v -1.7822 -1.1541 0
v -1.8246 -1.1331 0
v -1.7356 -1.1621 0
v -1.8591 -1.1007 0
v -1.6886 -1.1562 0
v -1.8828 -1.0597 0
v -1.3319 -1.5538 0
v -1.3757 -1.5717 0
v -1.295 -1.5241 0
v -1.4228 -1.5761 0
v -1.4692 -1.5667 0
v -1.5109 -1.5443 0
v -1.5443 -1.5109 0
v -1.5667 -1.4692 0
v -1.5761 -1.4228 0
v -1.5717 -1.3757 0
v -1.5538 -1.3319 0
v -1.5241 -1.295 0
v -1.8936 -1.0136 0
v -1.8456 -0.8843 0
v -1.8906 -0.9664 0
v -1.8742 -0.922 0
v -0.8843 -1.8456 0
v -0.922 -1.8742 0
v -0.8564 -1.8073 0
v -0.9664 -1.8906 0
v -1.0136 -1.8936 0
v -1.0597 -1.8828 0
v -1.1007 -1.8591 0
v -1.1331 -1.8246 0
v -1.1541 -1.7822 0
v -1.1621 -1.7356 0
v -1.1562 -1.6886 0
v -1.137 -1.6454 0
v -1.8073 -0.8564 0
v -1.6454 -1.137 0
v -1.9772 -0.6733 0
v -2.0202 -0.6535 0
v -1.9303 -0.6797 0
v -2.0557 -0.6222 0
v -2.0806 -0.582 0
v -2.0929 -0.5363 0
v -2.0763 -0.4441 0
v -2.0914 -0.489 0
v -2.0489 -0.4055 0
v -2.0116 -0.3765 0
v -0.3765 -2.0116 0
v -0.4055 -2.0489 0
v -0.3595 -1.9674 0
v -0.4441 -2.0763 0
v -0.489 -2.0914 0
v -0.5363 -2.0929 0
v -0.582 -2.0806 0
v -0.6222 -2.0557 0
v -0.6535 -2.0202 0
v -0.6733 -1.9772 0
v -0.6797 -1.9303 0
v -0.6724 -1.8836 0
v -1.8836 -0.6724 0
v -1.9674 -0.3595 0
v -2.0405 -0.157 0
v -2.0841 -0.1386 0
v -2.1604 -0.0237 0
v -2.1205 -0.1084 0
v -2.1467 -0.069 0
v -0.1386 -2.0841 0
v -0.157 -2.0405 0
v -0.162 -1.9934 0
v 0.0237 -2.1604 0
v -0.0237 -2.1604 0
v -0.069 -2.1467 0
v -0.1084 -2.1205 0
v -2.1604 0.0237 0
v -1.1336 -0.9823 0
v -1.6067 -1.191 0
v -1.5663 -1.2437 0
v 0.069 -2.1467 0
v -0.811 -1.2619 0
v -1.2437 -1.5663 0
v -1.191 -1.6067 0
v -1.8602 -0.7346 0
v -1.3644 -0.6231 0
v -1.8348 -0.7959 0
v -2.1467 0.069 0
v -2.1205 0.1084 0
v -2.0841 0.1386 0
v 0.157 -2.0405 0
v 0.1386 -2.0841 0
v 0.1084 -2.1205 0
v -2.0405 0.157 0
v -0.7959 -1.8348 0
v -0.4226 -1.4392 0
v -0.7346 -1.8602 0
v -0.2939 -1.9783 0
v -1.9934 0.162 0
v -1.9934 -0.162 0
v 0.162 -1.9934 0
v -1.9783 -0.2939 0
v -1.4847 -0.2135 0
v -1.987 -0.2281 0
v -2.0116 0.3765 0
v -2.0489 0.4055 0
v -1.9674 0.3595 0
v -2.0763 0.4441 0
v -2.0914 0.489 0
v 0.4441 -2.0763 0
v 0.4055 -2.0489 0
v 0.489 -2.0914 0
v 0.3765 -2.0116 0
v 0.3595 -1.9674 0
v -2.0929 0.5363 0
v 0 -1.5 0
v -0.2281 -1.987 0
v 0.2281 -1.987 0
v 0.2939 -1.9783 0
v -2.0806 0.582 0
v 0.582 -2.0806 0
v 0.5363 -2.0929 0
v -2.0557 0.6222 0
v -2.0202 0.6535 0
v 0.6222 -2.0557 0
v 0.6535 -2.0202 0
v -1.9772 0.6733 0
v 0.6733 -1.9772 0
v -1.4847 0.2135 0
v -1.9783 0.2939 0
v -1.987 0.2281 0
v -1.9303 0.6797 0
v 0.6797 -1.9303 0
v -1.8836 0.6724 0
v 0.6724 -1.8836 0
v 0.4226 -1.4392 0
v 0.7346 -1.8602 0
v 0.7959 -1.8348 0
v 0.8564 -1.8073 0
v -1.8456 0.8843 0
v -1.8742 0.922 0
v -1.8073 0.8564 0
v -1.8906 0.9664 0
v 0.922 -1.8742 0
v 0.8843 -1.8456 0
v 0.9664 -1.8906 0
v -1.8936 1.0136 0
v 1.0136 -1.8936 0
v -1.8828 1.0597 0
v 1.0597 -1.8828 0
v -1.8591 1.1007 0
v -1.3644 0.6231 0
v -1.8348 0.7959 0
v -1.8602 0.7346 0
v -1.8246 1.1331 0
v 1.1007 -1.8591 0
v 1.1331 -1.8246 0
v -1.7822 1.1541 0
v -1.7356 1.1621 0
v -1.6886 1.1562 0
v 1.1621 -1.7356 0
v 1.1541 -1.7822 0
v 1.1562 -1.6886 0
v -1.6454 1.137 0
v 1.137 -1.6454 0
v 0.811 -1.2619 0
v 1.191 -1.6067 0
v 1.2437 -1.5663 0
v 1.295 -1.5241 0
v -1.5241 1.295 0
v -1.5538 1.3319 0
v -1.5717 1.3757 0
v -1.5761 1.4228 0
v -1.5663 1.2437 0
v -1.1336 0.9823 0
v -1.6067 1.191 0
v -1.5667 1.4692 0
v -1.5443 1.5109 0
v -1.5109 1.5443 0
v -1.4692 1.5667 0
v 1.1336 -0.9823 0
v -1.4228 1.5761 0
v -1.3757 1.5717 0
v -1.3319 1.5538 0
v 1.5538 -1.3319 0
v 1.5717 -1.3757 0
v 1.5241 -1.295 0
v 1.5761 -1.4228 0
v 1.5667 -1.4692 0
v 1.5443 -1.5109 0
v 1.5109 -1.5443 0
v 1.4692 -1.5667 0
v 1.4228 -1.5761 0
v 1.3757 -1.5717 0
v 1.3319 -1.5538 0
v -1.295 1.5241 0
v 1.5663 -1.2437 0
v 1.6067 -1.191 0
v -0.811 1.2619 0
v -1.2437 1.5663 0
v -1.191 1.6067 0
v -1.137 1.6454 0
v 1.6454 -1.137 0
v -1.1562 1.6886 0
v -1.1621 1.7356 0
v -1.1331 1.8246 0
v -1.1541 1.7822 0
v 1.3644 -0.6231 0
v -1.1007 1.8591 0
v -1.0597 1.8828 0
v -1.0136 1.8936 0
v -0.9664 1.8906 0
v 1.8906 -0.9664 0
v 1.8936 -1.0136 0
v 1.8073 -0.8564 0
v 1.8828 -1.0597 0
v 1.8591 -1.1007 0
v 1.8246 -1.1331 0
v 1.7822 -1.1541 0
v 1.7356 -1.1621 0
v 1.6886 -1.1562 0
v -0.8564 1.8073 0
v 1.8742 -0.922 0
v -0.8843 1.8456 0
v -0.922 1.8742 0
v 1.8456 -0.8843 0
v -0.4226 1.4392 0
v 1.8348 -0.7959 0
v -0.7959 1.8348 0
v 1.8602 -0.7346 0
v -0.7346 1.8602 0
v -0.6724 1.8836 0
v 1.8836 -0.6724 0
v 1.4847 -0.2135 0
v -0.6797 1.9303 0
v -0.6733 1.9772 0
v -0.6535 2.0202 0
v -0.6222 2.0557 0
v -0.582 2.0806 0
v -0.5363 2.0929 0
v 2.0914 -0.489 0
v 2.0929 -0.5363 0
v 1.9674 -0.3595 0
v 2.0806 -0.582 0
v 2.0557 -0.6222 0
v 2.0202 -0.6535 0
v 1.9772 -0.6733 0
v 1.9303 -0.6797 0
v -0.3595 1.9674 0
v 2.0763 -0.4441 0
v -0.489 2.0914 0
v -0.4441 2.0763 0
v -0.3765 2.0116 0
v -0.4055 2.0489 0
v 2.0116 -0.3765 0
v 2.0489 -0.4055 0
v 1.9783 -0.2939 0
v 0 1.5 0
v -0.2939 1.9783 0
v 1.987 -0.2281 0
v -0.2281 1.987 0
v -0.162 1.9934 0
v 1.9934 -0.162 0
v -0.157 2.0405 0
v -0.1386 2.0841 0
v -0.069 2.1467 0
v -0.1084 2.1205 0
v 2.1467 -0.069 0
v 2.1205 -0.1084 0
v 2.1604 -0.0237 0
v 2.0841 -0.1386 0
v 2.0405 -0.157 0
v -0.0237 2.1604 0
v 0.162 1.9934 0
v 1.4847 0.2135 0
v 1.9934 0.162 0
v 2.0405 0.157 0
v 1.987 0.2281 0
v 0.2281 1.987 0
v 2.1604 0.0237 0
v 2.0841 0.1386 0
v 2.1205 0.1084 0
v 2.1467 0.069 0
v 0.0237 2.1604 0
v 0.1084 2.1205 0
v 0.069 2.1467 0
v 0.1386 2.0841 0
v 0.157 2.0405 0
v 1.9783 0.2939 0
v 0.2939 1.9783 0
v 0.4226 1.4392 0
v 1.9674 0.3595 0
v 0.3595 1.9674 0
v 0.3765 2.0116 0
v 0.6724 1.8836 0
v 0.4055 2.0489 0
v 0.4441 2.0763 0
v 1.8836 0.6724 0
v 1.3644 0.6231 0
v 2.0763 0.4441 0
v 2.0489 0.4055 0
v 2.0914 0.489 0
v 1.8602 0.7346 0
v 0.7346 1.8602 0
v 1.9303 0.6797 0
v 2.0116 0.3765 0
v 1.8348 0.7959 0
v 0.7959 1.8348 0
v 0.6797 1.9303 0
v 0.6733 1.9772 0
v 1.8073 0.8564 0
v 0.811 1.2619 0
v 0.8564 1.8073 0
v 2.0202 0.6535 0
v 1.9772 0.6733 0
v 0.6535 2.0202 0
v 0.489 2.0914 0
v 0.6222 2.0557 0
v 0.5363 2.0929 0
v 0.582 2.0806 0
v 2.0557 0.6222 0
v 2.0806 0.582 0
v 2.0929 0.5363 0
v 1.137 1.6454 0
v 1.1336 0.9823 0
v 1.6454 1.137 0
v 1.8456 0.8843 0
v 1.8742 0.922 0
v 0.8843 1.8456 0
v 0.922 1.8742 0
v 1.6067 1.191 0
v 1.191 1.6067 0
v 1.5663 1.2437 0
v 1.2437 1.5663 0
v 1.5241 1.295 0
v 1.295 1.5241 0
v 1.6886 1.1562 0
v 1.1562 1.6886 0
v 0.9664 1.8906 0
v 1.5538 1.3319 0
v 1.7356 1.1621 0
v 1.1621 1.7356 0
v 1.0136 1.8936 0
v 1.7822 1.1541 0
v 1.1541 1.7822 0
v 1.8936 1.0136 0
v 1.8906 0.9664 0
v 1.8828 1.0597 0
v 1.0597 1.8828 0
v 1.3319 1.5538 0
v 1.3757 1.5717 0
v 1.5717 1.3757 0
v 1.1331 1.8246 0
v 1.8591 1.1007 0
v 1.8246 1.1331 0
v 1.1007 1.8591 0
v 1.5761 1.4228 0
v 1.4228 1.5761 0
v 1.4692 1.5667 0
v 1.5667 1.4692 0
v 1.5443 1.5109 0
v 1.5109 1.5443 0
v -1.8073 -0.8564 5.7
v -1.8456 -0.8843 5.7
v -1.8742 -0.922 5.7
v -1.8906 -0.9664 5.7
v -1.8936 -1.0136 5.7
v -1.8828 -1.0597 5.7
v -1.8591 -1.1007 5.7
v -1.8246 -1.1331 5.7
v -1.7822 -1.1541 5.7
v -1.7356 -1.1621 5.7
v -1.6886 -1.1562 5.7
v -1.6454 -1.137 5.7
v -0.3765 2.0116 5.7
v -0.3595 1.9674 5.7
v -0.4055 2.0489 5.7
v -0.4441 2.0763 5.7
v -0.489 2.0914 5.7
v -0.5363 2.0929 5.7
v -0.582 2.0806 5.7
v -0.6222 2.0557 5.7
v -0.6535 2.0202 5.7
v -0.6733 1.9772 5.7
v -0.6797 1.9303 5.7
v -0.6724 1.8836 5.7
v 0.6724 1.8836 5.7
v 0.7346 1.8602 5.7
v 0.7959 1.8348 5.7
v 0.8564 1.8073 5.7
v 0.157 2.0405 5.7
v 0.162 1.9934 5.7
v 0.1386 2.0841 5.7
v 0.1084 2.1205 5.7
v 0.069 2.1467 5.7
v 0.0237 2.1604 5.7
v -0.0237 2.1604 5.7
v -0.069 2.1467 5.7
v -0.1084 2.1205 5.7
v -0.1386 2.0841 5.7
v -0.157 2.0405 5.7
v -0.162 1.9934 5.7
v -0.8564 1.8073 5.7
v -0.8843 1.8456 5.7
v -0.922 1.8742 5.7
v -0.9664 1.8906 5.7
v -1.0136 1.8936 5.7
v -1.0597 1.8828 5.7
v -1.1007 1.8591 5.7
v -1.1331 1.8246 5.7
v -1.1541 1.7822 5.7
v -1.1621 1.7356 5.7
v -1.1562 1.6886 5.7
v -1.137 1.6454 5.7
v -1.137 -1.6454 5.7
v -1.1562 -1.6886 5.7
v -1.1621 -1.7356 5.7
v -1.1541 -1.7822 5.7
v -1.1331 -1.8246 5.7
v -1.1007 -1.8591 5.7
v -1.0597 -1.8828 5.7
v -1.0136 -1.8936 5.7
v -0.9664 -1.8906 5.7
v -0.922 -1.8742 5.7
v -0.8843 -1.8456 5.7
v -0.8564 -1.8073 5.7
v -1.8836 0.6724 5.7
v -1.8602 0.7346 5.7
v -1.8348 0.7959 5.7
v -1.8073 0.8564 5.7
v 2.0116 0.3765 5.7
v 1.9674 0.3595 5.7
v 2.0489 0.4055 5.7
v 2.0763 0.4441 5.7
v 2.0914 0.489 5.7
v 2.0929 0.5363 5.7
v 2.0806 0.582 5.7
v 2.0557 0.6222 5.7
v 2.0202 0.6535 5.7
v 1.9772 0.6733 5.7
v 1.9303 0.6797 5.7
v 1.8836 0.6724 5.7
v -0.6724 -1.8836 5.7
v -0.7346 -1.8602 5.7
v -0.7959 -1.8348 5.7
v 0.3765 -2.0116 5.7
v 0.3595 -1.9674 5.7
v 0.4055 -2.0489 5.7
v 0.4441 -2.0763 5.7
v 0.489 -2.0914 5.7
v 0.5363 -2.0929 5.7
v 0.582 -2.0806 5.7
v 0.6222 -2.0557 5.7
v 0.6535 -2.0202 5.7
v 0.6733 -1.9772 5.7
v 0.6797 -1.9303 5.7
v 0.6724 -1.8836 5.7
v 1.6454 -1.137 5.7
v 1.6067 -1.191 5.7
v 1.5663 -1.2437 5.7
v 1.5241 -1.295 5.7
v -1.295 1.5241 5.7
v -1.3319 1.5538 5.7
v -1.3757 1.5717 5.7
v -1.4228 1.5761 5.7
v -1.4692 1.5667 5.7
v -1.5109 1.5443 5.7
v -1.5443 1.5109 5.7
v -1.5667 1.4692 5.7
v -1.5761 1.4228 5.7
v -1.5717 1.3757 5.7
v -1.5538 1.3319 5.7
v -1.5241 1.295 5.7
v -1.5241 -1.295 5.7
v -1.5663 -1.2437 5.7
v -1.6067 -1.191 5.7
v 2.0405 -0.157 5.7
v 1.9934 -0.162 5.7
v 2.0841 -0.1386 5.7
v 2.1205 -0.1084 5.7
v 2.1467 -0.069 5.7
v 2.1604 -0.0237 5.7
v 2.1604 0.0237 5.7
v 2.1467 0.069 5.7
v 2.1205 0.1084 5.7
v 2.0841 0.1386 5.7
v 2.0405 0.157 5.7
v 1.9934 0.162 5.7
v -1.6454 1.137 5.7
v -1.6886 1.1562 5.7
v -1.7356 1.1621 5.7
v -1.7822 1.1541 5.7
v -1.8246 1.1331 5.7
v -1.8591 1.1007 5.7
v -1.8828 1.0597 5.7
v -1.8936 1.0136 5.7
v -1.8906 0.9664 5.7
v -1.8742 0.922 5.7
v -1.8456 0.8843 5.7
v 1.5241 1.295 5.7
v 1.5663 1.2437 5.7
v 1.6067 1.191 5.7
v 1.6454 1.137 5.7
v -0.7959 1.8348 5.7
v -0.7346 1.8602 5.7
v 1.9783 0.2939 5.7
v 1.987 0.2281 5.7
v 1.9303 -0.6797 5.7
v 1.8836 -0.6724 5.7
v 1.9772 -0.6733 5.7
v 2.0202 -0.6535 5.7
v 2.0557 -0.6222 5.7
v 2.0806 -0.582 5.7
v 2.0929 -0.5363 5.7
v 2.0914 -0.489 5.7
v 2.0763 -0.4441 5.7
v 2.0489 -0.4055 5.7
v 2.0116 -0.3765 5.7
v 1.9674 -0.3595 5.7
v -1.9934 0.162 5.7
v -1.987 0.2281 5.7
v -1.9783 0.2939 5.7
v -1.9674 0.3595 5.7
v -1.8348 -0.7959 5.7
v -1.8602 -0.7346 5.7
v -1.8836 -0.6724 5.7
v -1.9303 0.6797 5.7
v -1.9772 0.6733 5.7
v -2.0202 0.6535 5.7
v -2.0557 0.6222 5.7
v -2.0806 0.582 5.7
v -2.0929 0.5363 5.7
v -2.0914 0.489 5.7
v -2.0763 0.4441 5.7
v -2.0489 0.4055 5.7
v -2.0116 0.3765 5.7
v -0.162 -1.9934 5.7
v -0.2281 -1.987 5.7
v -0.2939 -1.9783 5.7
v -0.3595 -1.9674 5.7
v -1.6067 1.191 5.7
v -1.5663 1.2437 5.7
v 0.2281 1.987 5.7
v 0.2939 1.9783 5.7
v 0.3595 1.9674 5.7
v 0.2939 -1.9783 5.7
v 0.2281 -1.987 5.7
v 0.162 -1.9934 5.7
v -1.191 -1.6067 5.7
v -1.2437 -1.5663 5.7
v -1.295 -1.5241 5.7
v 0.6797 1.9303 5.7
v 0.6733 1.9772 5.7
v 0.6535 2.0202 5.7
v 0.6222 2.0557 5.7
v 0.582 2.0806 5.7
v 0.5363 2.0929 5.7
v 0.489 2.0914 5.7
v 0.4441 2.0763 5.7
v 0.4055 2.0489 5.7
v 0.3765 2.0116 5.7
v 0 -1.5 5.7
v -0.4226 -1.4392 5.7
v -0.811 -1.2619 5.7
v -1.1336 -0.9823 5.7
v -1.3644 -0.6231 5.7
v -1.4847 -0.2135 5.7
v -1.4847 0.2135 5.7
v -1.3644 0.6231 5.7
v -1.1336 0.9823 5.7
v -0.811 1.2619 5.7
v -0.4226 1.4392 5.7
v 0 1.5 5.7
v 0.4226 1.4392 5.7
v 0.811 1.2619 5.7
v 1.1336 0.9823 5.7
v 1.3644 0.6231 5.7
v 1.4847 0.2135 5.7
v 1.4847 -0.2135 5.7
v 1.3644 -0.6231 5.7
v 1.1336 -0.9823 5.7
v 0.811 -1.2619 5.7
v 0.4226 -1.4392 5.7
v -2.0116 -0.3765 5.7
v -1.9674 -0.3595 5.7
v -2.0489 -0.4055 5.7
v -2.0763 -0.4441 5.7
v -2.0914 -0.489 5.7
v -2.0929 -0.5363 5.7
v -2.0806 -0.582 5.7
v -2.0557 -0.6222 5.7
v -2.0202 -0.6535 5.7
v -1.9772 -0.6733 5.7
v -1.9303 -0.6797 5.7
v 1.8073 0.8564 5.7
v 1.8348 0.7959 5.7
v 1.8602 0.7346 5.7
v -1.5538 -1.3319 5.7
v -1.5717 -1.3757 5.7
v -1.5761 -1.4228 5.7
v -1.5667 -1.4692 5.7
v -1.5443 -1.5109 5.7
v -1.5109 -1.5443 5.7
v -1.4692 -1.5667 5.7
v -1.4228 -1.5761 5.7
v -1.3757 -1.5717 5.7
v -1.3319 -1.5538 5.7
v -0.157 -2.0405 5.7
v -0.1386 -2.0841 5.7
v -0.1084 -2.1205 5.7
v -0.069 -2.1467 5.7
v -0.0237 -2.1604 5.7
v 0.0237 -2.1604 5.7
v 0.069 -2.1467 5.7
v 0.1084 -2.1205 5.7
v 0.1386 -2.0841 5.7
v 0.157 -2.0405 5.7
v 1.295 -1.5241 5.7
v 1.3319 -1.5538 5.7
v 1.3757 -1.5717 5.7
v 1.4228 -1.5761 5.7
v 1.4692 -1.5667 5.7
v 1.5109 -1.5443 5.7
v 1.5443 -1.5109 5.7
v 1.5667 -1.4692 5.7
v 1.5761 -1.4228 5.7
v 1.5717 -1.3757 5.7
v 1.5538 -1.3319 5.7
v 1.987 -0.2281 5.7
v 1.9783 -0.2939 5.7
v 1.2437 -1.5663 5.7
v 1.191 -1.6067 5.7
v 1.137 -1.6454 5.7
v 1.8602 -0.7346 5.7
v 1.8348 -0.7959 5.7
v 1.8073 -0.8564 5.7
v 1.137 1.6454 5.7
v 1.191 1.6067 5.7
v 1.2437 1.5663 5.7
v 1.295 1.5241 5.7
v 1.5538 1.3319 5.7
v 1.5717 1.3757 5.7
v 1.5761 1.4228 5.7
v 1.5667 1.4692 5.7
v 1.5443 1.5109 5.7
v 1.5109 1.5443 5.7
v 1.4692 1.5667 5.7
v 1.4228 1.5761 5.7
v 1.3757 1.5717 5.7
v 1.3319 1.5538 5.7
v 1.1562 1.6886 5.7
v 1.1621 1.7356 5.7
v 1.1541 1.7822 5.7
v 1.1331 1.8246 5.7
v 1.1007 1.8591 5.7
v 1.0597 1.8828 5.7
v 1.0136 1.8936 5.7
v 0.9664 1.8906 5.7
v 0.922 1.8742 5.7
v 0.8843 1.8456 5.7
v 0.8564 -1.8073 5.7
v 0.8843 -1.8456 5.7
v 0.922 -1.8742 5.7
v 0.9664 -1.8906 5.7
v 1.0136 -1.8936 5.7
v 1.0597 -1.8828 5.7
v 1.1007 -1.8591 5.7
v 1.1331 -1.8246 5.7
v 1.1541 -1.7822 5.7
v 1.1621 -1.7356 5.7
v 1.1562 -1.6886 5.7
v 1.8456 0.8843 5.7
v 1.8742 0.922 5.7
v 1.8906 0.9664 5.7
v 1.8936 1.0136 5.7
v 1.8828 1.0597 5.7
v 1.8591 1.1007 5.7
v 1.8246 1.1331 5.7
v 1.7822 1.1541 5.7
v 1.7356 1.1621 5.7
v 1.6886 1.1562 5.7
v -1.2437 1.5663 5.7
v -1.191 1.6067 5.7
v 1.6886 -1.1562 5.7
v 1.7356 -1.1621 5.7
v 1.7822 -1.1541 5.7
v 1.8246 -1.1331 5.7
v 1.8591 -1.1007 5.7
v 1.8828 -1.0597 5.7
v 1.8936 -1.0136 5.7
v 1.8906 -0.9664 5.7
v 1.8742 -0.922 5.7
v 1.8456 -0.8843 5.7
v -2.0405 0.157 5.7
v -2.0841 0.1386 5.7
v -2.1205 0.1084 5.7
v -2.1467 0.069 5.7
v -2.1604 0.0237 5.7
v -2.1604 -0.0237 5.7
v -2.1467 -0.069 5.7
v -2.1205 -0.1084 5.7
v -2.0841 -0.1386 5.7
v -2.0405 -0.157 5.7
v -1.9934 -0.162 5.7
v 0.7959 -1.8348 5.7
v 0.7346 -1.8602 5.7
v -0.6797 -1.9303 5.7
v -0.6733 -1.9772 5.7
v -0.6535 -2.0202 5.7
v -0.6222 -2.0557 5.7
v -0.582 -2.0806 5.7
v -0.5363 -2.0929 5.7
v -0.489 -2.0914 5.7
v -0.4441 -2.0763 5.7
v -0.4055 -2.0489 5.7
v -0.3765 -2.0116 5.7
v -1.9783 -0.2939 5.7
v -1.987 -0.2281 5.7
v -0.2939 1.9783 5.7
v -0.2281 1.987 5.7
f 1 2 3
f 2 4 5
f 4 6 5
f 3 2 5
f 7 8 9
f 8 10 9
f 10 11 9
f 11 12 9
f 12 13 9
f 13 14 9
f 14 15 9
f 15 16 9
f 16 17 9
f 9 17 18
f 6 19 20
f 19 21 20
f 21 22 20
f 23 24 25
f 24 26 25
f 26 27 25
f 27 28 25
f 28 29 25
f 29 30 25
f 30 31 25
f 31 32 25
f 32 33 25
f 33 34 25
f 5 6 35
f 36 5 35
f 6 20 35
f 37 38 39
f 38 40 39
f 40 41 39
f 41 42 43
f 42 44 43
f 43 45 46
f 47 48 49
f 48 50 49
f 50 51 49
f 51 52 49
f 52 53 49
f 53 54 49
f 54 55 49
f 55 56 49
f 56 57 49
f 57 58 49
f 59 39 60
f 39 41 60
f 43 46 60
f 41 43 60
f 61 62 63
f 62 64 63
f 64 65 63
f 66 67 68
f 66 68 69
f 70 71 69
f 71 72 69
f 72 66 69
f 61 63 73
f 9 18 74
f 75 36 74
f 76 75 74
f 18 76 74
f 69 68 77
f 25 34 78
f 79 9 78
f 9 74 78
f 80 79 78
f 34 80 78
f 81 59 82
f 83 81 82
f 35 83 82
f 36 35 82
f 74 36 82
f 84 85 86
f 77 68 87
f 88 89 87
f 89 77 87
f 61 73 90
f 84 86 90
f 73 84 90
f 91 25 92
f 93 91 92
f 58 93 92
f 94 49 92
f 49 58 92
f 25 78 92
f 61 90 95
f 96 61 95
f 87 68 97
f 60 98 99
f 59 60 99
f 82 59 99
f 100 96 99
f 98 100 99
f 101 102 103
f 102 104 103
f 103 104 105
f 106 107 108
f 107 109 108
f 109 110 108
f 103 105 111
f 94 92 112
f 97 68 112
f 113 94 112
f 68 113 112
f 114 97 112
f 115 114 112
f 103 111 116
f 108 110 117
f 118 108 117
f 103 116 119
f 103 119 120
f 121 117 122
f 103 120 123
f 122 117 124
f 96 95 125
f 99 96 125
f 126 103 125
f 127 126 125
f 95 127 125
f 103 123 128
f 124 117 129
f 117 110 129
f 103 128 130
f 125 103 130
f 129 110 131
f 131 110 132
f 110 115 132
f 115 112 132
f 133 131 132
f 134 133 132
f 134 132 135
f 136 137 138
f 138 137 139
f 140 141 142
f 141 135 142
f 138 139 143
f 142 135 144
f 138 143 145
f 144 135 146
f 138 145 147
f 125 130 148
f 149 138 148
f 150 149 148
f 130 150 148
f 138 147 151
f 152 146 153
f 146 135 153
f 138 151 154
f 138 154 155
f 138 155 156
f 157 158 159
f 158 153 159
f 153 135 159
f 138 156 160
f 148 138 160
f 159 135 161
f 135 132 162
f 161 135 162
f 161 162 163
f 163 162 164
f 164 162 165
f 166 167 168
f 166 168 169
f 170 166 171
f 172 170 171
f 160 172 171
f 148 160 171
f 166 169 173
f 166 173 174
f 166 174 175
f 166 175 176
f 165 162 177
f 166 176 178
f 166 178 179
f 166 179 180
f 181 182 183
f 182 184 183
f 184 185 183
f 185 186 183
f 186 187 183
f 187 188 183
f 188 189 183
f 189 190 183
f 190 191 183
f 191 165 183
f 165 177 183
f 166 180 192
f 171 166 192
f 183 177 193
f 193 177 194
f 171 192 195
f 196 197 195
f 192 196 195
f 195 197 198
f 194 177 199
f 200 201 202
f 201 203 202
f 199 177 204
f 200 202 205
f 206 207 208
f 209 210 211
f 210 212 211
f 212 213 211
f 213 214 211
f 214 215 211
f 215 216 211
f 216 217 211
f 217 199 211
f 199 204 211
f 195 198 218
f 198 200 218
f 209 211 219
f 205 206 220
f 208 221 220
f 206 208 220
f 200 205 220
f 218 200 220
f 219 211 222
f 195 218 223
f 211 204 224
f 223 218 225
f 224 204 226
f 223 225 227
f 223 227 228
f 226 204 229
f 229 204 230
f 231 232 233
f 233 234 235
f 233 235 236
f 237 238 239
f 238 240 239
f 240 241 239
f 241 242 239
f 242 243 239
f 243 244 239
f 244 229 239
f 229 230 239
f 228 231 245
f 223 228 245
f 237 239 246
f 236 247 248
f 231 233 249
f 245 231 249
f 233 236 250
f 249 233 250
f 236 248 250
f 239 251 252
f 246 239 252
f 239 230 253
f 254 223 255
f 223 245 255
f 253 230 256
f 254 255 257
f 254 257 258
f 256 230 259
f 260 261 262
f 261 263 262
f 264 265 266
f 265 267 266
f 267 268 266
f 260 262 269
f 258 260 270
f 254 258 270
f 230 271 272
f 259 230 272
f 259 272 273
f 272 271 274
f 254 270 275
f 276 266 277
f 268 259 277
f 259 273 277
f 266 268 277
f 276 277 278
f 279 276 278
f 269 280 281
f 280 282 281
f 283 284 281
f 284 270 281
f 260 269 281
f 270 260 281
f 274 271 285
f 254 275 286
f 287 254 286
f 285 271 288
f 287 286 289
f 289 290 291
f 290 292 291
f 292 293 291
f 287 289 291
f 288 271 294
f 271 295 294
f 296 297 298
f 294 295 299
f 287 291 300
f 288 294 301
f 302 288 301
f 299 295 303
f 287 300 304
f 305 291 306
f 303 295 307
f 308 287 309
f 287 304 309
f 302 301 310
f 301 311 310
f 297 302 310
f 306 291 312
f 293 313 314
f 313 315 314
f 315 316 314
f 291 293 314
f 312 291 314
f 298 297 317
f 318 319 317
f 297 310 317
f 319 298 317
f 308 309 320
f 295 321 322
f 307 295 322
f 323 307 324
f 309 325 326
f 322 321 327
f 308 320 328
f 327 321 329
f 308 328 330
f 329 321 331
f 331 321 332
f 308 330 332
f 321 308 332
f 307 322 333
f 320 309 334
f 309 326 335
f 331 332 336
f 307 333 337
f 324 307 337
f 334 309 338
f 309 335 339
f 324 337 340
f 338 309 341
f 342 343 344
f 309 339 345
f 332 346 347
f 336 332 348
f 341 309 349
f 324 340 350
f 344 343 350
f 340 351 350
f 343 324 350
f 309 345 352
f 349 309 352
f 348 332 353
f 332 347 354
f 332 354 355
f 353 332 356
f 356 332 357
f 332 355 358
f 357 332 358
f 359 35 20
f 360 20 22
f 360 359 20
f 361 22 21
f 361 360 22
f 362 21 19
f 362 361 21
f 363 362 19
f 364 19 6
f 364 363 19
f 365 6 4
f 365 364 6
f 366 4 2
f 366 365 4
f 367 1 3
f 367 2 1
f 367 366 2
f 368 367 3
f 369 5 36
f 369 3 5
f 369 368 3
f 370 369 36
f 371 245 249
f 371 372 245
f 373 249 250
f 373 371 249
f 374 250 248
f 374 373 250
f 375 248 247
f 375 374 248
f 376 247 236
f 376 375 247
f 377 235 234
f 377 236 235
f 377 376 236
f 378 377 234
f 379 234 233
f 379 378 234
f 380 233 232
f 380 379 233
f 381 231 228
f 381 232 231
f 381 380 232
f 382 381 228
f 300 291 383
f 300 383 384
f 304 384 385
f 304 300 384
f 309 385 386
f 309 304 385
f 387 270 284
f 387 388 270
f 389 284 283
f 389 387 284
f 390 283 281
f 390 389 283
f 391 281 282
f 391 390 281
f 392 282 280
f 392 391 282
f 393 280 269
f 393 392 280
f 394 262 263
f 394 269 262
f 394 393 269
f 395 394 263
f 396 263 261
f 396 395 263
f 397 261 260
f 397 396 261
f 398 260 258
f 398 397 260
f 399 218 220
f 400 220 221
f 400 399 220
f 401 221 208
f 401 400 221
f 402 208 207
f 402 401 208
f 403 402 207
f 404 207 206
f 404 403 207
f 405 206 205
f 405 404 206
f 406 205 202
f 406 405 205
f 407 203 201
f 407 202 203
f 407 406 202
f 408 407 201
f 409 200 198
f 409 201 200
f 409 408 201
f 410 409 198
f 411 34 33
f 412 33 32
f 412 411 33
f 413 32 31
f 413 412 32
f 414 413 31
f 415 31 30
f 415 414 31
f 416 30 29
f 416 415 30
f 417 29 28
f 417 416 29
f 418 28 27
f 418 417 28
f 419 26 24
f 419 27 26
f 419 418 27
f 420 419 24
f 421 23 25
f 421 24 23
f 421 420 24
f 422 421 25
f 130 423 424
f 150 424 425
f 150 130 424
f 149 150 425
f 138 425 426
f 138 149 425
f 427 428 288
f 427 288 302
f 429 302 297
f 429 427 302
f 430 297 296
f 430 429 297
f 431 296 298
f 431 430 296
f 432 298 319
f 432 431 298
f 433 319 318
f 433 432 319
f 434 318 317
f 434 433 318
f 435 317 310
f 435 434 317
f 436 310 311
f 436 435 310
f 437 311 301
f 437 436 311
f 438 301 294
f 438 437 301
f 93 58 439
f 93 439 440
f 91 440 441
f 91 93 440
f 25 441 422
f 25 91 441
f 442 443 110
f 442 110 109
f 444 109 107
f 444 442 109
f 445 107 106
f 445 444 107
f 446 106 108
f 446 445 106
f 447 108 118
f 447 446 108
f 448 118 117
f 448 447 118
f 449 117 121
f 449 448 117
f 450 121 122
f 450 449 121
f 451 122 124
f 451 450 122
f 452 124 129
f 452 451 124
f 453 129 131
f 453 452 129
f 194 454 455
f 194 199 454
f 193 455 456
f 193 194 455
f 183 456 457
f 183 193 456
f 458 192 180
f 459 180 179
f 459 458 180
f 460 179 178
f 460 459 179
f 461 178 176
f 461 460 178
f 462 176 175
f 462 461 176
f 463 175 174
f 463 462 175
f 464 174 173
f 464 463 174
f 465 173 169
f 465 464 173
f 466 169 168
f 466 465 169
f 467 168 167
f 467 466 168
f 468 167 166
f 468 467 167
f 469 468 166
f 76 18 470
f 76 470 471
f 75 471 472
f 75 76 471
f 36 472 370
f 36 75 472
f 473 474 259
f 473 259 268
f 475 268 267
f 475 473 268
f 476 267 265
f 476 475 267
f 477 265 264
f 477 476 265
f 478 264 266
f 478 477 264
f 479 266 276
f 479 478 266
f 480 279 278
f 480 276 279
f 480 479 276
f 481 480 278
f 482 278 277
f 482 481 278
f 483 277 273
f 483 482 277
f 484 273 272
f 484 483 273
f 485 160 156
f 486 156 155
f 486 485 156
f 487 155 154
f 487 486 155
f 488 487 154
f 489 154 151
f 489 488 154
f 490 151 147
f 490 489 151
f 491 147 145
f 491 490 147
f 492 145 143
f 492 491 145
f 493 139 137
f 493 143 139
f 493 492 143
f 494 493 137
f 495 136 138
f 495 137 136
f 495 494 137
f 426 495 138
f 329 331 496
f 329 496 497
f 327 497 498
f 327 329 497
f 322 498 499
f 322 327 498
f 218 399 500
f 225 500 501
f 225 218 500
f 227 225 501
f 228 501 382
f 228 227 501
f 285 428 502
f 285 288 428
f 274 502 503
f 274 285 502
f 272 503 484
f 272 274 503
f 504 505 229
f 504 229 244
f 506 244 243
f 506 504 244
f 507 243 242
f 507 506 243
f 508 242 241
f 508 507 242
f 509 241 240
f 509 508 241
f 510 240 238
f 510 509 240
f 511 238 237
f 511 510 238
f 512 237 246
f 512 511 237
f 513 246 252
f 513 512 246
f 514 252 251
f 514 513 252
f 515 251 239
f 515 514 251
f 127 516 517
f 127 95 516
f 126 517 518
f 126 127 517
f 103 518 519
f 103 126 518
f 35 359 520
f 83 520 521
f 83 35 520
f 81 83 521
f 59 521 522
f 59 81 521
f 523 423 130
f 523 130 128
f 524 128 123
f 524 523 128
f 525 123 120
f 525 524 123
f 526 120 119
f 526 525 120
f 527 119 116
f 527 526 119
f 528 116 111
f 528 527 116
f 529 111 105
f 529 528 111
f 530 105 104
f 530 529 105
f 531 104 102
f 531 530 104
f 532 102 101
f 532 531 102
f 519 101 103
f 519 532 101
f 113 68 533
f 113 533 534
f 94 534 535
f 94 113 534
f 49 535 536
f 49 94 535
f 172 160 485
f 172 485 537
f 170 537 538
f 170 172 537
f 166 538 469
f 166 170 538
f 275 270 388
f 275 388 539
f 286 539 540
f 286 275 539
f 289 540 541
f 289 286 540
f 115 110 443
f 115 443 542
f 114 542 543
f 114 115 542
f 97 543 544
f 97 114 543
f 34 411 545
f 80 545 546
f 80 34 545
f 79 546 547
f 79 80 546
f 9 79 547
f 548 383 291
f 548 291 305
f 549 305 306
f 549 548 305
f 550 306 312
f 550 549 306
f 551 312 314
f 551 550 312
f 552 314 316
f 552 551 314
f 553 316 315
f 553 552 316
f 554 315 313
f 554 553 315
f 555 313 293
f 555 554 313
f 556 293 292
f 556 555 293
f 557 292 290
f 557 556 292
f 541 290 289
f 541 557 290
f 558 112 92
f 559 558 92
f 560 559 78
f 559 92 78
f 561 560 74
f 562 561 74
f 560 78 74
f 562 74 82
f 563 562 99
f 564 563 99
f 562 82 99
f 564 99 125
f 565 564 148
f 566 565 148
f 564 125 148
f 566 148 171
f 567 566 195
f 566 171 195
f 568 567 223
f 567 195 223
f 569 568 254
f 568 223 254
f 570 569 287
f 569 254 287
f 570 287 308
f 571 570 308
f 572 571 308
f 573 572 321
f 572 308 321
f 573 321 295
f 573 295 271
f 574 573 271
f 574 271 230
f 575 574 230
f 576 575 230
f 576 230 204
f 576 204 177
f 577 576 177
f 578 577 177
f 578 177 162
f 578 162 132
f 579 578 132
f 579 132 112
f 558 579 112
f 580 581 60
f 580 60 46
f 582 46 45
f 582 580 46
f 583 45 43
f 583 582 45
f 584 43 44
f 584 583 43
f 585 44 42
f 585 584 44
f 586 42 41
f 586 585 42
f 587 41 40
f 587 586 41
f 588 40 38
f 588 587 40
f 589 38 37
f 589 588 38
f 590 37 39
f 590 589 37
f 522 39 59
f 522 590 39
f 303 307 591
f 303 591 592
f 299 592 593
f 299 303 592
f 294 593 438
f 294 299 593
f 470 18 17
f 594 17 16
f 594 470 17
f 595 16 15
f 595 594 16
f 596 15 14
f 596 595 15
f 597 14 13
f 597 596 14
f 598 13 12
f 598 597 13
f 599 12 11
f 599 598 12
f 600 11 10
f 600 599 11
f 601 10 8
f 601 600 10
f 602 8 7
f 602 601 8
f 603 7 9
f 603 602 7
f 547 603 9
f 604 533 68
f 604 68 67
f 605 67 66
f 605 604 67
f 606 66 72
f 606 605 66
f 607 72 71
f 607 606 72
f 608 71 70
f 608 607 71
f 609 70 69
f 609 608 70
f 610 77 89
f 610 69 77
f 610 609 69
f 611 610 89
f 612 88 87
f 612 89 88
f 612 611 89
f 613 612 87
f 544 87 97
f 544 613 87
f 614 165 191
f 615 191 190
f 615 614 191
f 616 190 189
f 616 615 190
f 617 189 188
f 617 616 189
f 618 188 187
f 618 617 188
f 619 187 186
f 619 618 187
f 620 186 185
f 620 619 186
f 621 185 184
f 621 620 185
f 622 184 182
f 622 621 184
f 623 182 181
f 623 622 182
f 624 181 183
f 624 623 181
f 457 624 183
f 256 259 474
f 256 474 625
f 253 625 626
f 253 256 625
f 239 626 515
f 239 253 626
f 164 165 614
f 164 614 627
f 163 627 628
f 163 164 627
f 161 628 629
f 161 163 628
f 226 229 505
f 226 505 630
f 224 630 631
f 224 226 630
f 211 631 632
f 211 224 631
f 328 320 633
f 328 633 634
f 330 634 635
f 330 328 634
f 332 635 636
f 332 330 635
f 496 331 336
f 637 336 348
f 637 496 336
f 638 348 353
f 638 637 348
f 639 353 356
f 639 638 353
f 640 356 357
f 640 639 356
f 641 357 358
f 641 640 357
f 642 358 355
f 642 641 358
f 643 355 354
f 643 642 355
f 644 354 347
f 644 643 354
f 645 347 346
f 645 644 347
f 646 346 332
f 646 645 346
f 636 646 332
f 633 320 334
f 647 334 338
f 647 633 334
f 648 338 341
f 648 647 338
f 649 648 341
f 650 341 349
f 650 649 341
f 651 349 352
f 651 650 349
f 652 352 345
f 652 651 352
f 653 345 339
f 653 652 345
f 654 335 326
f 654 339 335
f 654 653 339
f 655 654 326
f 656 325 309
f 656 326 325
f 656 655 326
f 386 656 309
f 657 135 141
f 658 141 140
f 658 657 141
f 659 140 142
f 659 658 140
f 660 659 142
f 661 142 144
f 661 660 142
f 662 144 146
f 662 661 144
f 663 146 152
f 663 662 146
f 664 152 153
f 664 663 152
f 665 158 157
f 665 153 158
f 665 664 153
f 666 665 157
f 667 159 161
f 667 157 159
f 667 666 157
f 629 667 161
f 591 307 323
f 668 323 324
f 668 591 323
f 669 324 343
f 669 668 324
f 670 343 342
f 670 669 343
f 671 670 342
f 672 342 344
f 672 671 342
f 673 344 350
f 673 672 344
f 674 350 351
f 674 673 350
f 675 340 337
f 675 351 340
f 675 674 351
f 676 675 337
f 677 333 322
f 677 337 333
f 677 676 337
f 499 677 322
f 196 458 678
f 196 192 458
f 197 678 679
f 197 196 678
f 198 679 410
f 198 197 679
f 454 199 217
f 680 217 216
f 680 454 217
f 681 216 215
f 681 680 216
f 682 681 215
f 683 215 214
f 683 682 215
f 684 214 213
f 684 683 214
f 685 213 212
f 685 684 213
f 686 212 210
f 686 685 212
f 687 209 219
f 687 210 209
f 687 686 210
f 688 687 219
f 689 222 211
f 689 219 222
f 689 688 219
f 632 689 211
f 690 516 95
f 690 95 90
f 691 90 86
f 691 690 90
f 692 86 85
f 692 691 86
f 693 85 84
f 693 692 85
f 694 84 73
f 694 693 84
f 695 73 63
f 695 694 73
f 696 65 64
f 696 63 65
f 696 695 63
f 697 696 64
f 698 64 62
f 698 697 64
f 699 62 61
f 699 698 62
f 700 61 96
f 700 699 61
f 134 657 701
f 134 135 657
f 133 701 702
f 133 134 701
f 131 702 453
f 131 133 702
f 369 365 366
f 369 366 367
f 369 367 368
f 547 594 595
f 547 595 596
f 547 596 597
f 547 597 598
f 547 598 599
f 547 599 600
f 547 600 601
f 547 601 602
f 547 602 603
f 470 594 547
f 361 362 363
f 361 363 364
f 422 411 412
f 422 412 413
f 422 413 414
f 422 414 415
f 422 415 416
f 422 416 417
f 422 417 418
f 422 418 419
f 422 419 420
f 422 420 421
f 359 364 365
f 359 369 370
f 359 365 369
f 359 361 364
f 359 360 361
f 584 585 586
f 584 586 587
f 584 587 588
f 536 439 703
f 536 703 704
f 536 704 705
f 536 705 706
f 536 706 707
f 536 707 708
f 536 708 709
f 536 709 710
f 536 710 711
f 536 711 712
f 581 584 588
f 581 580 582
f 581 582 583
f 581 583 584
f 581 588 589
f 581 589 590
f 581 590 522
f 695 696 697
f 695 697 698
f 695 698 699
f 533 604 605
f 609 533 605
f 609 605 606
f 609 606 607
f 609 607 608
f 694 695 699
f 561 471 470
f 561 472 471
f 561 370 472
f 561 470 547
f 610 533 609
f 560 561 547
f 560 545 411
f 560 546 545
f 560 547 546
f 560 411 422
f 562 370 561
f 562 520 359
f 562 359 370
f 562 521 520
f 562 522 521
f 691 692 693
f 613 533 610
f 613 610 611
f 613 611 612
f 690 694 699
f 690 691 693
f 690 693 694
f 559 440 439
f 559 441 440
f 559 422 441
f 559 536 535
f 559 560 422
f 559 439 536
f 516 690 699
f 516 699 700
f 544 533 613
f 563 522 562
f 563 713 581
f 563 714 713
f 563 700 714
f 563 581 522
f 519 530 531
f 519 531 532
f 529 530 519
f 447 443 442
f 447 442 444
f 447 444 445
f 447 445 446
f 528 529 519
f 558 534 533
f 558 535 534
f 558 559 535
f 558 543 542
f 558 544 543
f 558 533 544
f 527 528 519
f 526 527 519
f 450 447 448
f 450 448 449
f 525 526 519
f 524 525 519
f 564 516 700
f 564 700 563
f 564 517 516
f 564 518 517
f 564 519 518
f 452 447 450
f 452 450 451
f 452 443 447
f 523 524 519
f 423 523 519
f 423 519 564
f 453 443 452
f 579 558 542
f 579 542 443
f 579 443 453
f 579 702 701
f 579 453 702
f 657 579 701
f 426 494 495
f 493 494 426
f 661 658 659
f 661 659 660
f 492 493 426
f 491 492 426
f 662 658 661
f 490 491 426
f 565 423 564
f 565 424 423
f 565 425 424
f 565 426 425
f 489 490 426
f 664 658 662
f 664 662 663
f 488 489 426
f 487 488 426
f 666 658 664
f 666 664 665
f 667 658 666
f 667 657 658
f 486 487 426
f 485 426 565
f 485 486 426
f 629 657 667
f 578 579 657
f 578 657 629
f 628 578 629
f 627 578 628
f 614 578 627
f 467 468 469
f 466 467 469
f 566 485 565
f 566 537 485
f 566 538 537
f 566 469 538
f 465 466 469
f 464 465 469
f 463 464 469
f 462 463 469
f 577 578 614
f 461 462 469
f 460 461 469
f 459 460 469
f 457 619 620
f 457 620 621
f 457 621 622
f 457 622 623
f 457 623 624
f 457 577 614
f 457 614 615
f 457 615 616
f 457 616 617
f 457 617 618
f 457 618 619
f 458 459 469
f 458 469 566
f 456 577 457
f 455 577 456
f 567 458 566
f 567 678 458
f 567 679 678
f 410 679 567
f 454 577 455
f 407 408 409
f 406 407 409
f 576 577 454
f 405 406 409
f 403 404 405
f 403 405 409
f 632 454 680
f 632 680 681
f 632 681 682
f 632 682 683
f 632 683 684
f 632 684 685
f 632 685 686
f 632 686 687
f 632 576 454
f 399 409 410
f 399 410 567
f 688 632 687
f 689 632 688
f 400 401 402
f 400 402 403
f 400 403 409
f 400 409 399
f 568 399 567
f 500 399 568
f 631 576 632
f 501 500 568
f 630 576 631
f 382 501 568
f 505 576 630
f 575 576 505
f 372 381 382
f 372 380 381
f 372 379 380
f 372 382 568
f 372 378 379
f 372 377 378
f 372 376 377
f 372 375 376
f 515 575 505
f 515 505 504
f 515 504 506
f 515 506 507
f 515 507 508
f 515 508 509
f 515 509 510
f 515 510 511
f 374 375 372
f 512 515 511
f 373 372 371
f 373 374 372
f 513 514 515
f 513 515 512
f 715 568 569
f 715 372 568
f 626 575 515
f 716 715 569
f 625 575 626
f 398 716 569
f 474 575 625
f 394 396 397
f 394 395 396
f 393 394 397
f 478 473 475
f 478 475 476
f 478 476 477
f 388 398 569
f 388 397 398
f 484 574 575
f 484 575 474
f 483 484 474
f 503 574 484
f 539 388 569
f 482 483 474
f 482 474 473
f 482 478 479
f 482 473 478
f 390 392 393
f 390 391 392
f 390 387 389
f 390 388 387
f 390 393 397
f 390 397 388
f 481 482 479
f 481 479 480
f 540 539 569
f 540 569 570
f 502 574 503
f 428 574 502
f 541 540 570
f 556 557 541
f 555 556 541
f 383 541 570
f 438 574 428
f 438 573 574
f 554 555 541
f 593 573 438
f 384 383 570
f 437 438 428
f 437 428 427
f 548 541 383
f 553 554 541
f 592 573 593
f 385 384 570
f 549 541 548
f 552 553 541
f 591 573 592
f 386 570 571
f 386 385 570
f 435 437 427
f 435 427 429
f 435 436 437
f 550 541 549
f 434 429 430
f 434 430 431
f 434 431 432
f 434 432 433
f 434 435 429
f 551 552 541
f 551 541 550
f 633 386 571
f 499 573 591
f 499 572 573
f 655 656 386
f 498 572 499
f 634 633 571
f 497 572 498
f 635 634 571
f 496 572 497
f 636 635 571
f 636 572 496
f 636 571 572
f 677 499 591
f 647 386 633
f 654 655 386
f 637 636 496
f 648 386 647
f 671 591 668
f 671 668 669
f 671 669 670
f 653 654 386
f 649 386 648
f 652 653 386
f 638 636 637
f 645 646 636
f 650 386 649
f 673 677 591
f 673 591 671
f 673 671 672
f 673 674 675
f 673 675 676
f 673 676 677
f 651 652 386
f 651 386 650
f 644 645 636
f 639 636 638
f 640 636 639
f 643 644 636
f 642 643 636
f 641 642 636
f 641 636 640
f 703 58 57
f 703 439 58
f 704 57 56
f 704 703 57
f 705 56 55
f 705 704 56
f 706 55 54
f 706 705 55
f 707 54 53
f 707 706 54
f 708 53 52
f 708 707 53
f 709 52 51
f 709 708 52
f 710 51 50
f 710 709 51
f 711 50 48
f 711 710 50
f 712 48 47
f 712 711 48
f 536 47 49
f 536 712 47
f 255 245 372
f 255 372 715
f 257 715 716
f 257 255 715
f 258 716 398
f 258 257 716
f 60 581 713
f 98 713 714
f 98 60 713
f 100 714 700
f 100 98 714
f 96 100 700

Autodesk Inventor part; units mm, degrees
ref_plane "YZ Plane" through (0, 0, 0) normal (1, 0, 0) x (0, 1, 0)
ref_plane "XZ Plane" through (0, 0, 0) normal (0, 1, 0) x (-1, 0, 0)
ref_plane "XY Plane" through (0, 0, 0) normal (0, 0, 1) x (1, 0, 0)
sketch "Sketch1" plane through (0, 0, 0) normal (0, 0, 1) x (1, 0, 0)
  circle A0 centre (0, 0) radius 2
  dimension "d0" = 4
extrude "Extrusion1" add sketch "Sketch1" along normal blind 5.7
sketch "Sketch2" plane through (0, 0, 5.7) normal (0, 0, 1) x (1, 0, 0)
  circle A0 centre (0, 0) radius 2 projected
  circle A1 centre (0, 2) radius 0.1621
extrude "Extrusion2" add sketch "Sketch2" against normal blind 5.7 contours A1 A0 | A0 A1 picked at (0, 1.9455) picked at (0.0067, 2.0531)
pattern_circular "Circular Pattern1" count 24 over 360 about axis through (0, 0, -10) along (0, 0, 1) of "Extrusion2"
sketch "Sketch3" plane through (0, 0, 5.7) normal (0, 0, 1) x (1, 0, 0)
  point P0 (0, 0)
  point P1 (0, 0)
hole "Hole1" at (0, 0, 5.7) direction (0, 0, -1) diameter 3 end through all
thread "Thread1" size "M3x0.5" class "6H" standard "ANSI Metric M Profile" full length
properties part number "M3ThreadedInsert"
